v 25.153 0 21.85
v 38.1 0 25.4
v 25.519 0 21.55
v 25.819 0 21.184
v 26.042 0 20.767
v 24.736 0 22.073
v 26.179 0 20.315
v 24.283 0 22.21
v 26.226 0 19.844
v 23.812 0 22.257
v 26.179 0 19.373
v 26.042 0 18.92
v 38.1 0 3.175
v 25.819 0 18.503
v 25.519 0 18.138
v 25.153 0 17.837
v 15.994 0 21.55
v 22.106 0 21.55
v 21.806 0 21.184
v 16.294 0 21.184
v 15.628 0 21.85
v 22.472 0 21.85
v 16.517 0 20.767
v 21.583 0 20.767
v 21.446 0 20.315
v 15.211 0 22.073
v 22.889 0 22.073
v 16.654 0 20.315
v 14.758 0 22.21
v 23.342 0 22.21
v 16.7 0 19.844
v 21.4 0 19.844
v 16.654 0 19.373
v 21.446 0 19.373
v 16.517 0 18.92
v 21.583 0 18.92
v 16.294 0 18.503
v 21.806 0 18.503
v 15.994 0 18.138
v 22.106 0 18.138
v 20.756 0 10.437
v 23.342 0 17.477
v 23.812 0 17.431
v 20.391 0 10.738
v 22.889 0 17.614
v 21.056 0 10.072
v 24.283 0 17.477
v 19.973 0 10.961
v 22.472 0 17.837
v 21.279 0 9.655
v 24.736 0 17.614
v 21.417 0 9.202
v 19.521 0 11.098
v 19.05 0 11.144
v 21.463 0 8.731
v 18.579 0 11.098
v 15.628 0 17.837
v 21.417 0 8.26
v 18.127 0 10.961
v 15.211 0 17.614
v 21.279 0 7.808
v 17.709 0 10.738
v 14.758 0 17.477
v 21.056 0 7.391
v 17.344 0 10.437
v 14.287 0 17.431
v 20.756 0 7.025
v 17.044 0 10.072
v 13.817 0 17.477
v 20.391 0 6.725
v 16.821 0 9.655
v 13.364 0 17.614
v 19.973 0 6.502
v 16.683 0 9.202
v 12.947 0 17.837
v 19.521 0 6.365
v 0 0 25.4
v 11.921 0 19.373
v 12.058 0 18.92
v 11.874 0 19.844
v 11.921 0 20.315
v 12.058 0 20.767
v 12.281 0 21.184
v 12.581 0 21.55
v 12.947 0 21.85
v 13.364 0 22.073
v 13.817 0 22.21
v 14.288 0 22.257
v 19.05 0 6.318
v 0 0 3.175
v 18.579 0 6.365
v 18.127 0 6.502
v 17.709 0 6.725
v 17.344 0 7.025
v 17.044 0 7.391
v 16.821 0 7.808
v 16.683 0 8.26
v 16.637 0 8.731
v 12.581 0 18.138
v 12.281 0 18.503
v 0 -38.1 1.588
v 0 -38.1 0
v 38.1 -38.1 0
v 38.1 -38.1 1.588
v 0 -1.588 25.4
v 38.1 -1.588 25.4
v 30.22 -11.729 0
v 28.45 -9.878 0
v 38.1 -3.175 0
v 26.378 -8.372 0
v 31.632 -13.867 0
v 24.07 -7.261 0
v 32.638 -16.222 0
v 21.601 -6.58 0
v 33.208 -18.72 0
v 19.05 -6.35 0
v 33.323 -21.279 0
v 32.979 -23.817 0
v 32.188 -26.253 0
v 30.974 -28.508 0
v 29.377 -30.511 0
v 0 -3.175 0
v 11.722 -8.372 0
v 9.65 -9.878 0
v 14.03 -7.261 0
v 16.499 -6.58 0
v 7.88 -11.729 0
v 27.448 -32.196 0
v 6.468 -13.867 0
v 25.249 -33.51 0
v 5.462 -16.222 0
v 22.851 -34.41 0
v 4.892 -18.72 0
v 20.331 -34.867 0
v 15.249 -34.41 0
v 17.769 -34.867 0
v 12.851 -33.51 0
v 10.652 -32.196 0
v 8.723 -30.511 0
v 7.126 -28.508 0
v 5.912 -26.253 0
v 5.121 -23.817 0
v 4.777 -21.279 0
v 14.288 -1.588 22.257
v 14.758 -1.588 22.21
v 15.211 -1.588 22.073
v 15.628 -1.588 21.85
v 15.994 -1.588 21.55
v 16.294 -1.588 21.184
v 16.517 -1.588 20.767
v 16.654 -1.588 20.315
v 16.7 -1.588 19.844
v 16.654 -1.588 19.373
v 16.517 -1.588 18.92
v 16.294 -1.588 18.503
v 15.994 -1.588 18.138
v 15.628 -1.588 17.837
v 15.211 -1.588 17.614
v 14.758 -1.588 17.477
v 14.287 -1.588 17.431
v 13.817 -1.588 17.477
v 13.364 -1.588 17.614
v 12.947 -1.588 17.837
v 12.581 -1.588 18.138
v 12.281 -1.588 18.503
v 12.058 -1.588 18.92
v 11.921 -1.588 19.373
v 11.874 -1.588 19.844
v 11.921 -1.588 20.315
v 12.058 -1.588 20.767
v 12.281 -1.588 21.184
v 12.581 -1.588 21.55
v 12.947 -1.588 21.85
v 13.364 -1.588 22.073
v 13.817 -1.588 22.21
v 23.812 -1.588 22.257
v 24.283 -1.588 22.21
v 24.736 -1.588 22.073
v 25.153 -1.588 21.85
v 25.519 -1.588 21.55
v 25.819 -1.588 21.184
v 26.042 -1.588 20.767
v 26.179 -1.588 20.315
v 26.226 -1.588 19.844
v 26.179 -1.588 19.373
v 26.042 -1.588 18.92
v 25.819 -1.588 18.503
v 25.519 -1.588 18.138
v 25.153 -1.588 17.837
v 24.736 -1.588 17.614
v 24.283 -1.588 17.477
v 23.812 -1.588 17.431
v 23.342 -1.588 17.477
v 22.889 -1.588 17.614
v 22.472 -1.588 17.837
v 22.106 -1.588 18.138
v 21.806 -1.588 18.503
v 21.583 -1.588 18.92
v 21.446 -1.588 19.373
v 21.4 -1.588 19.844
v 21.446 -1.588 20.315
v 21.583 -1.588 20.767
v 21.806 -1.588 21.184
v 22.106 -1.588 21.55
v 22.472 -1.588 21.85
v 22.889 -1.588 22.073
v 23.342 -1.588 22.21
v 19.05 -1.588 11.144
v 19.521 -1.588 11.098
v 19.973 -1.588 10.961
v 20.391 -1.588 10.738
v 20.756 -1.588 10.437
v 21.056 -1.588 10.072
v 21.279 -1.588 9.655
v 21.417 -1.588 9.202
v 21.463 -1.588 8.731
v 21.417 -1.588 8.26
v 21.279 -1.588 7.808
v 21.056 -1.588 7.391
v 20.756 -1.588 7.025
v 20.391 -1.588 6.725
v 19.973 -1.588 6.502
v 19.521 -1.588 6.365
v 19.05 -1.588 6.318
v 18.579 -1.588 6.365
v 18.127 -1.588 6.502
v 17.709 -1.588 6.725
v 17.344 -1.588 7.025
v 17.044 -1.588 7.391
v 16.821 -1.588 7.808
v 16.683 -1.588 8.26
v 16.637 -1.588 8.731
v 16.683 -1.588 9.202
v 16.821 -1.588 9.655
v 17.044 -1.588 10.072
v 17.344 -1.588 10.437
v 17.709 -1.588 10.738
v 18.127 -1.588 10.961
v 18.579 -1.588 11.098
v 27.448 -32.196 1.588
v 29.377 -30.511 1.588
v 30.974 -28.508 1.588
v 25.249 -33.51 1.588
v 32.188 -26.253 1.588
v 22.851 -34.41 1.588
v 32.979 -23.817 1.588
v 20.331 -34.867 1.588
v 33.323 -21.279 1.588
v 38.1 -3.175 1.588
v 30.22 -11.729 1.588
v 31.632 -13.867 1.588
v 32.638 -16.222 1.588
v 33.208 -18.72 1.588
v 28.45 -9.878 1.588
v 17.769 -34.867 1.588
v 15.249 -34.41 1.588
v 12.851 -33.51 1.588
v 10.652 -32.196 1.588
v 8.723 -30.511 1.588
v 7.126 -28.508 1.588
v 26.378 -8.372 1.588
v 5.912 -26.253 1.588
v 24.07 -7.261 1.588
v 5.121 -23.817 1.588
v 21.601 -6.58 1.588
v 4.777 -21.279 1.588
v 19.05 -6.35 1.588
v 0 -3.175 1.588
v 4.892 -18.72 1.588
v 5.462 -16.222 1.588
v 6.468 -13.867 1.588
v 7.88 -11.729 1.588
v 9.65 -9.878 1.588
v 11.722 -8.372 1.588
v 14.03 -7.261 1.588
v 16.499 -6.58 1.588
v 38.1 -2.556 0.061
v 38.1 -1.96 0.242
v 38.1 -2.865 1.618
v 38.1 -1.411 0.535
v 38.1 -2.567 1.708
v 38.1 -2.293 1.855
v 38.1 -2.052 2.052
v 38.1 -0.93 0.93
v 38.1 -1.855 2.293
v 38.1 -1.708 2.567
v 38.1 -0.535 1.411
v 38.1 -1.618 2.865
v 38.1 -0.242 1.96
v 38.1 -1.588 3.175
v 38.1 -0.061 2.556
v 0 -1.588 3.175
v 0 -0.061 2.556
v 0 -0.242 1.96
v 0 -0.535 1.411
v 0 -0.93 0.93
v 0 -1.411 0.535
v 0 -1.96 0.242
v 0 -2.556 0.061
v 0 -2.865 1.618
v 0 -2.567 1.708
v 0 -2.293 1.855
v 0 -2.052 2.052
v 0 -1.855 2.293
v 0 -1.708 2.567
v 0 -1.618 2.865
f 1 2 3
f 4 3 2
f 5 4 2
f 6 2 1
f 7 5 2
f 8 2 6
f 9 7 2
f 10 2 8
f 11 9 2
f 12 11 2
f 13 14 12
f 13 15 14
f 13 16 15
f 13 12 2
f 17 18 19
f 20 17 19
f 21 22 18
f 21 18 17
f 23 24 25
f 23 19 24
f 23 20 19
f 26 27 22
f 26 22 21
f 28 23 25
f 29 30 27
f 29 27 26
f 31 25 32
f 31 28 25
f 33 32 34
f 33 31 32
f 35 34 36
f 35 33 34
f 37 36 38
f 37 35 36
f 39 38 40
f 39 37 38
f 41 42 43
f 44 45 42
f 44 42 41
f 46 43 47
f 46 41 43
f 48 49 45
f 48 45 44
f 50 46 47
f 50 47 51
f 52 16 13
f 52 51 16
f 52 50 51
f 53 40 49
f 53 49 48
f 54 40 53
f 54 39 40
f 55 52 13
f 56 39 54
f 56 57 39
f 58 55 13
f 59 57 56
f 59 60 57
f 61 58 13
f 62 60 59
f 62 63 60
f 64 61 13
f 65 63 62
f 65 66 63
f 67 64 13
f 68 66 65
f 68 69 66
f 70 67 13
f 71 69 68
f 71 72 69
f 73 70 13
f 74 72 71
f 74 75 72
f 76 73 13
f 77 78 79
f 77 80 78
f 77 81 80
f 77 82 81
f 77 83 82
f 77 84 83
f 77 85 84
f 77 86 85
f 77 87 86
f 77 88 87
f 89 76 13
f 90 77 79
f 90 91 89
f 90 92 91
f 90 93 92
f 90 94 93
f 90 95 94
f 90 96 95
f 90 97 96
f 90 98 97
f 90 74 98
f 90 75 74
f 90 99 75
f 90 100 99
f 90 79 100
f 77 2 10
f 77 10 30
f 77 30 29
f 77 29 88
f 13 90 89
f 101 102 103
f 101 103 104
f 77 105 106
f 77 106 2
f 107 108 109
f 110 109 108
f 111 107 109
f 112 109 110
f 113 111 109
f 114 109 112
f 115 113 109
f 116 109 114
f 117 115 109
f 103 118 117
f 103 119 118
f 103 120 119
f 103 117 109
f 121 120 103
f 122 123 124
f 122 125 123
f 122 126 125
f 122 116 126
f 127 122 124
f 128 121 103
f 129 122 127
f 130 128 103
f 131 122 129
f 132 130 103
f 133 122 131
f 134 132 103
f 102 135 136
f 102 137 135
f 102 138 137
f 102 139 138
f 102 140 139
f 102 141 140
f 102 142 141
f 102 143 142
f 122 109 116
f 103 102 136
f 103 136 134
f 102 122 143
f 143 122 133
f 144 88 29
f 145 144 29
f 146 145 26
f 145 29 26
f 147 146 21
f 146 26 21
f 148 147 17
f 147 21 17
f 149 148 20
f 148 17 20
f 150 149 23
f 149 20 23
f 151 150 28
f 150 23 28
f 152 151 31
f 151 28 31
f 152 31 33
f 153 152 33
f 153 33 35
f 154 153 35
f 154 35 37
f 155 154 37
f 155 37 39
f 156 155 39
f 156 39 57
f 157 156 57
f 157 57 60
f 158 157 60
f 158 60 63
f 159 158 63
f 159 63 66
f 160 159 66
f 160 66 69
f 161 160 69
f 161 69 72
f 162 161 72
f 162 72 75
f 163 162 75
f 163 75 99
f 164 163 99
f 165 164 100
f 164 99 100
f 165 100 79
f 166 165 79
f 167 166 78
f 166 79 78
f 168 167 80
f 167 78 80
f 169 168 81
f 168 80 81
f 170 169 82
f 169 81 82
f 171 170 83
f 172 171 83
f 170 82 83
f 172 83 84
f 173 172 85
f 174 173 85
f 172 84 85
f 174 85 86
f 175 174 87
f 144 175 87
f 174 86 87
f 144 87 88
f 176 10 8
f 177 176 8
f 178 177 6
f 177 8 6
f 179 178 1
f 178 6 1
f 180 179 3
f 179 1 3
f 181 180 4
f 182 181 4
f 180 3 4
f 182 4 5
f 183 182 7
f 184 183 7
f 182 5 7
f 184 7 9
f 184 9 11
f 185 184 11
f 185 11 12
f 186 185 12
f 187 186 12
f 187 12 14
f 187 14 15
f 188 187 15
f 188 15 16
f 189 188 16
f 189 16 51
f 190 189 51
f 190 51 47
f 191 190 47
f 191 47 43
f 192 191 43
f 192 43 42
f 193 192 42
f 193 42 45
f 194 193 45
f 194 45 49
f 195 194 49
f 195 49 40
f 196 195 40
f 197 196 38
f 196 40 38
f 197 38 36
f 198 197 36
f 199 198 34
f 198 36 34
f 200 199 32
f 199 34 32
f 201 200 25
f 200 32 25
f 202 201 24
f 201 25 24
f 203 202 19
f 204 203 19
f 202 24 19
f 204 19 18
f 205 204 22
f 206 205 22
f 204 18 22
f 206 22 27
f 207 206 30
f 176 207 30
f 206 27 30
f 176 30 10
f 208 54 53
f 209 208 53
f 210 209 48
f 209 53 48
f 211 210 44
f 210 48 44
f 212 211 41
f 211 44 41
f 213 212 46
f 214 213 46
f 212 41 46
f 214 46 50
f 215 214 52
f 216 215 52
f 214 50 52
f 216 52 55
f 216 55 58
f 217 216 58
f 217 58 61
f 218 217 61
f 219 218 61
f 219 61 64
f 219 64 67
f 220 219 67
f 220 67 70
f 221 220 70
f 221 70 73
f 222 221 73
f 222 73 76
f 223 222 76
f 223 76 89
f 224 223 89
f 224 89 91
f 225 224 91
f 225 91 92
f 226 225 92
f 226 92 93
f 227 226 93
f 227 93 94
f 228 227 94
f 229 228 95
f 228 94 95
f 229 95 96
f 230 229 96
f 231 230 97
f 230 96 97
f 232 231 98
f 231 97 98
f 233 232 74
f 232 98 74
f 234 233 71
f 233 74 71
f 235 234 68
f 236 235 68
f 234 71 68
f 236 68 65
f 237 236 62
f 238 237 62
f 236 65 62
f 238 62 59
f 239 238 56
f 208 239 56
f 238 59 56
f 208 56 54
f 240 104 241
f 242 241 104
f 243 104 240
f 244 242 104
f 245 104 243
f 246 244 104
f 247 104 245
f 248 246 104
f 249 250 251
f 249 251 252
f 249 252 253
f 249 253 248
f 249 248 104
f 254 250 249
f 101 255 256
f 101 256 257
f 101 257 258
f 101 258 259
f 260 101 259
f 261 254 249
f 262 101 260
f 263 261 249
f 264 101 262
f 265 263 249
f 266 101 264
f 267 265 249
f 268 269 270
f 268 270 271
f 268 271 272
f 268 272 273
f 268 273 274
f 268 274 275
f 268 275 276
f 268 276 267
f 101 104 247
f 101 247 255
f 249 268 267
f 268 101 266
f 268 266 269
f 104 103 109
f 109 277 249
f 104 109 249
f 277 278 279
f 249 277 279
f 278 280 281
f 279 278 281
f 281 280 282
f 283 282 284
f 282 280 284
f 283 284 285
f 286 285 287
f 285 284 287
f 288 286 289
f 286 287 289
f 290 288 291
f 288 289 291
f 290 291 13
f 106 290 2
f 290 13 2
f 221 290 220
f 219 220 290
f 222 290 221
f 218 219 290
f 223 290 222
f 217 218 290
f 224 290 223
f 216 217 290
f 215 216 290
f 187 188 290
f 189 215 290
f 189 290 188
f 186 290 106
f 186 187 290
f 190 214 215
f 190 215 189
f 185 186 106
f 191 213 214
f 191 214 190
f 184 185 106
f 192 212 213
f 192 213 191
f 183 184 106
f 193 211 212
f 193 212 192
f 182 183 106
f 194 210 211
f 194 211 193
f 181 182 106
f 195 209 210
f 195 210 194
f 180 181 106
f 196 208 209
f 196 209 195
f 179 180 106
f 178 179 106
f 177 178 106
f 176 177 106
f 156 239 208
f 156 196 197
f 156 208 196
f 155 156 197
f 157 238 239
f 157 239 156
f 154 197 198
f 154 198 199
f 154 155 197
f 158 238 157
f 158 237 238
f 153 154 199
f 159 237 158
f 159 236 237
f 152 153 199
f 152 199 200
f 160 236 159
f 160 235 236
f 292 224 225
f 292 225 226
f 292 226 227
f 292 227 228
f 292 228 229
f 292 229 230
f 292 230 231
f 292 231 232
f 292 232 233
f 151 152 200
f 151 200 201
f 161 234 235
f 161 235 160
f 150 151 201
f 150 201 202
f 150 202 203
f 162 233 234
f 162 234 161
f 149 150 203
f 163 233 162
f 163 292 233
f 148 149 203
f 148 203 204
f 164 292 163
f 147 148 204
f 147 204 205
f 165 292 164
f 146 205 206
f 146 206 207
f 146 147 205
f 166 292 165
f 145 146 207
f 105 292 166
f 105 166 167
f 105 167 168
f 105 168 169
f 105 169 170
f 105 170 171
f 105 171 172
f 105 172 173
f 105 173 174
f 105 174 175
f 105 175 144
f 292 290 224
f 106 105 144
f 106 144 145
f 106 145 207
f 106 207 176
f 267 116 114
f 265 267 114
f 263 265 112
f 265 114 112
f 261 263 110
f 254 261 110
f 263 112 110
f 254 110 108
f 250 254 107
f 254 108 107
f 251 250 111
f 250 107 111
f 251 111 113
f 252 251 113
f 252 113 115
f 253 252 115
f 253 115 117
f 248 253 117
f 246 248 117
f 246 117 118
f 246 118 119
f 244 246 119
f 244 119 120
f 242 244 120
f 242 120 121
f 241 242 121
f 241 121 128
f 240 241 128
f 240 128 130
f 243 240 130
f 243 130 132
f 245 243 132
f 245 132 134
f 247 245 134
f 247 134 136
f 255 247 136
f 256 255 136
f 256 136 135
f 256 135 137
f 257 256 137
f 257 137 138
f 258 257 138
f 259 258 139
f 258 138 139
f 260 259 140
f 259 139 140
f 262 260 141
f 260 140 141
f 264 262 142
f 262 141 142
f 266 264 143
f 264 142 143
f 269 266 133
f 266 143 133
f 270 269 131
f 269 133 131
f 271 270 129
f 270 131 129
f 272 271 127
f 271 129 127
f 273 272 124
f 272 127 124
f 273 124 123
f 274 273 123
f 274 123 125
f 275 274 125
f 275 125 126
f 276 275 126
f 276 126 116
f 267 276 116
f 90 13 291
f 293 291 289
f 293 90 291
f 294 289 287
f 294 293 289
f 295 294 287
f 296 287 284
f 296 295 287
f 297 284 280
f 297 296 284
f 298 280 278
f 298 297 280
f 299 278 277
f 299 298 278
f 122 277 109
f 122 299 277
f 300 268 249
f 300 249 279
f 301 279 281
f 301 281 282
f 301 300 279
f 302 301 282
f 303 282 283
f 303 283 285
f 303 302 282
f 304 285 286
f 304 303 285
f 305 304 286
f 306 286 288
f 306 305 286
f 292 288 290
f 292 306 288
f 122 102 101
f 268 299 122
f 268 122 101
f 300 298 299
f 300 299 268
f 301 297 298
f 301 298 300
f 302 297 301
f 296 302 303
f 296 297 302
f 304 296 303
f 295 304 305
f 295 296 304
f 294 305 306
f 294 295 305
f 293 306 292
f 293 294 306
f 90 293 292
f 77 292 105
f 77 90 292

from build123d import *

# Parameters (mm, degrees)
BASE_FLANGE1_DEPTH = 38.1
SKETCH6_R          = 2.413
CUT_EXTRUDE2_DEPTH = 2.54
SKETCH8_R          = 14.2875
CUT_EXTRUDE3_DEPTH = 2.54


# Sheet-metal steps are written as plain solids
with BuildPart() as part:
    # Sketch1 → Base-Flange1 (new body)
    with BuildSketch(Plane(origin=(0, 0, 0), x_dir=(0, 0, -1), z_dir=(1, 0, 0))):
        with BuildLine():
            Line((-25.4, 0), (-3.175, 0))
            ThreePointArc((-3.175, 0), (-0.92993597, -0.92993597), (0, -3.175))
            Line((0, -3.175), (0, -38.1))
            Line((0, -38.1), (-1.5875, -38.1))
            Line((-1.5875, -38.1), (-1.5875, -3.175))
            ThreePointArc((-1.5875, -3.175), (-2.052467985, -2.052467985), (-3.175, -1.5875))
            Line((-3.175, -1.5875), (-25.4, -1.5875))
            Line((-25.4, -1.5875), (-25.4, 0))
        make_face()
    extrude(amount=BASE_FLANGE1_DEPTH)

    # Sketch6 → Cut-Extrude2 (cut)
    with BuildSketch(Plane(origin=(0, 0, 0), x_dir=(1, 0, 0), z_dir=(0, 1, 0))):
        with Locations(Location((23.8125, -19.84375, 0), (0, 0, 270))):
            Circle(SKETCH6_R)
        with Locations(Location((19.05, -8.73125, 0), (0, 0, 270))):
            Circle(SKETCH6_R)
        with Locations(Location((14.2875, -19.84375, 0), (0, 0, 270))):
            Circle(SKETCH6_R)
    extrude(amount=-CUT_EXTRUDE2_DEPTH, mode=Mode.SUBTRACT)

    # Sketch8 → Cut-Extrude3 (cut)
    with BuildSketch(Plane(origin=(0, 0, 0), x_dir=(-1, 0, 0), z_dir=(0, 0, -1))):
        with Locations(Location((-19.05, -20.6375, 0), (0, 0, 90))):
            Circle(SKETCH8_R)
    extrude(amount=-CUT_EXTRUDE3_DEPTH, mode=Mode.SUBTRACT)


solid = part.part
